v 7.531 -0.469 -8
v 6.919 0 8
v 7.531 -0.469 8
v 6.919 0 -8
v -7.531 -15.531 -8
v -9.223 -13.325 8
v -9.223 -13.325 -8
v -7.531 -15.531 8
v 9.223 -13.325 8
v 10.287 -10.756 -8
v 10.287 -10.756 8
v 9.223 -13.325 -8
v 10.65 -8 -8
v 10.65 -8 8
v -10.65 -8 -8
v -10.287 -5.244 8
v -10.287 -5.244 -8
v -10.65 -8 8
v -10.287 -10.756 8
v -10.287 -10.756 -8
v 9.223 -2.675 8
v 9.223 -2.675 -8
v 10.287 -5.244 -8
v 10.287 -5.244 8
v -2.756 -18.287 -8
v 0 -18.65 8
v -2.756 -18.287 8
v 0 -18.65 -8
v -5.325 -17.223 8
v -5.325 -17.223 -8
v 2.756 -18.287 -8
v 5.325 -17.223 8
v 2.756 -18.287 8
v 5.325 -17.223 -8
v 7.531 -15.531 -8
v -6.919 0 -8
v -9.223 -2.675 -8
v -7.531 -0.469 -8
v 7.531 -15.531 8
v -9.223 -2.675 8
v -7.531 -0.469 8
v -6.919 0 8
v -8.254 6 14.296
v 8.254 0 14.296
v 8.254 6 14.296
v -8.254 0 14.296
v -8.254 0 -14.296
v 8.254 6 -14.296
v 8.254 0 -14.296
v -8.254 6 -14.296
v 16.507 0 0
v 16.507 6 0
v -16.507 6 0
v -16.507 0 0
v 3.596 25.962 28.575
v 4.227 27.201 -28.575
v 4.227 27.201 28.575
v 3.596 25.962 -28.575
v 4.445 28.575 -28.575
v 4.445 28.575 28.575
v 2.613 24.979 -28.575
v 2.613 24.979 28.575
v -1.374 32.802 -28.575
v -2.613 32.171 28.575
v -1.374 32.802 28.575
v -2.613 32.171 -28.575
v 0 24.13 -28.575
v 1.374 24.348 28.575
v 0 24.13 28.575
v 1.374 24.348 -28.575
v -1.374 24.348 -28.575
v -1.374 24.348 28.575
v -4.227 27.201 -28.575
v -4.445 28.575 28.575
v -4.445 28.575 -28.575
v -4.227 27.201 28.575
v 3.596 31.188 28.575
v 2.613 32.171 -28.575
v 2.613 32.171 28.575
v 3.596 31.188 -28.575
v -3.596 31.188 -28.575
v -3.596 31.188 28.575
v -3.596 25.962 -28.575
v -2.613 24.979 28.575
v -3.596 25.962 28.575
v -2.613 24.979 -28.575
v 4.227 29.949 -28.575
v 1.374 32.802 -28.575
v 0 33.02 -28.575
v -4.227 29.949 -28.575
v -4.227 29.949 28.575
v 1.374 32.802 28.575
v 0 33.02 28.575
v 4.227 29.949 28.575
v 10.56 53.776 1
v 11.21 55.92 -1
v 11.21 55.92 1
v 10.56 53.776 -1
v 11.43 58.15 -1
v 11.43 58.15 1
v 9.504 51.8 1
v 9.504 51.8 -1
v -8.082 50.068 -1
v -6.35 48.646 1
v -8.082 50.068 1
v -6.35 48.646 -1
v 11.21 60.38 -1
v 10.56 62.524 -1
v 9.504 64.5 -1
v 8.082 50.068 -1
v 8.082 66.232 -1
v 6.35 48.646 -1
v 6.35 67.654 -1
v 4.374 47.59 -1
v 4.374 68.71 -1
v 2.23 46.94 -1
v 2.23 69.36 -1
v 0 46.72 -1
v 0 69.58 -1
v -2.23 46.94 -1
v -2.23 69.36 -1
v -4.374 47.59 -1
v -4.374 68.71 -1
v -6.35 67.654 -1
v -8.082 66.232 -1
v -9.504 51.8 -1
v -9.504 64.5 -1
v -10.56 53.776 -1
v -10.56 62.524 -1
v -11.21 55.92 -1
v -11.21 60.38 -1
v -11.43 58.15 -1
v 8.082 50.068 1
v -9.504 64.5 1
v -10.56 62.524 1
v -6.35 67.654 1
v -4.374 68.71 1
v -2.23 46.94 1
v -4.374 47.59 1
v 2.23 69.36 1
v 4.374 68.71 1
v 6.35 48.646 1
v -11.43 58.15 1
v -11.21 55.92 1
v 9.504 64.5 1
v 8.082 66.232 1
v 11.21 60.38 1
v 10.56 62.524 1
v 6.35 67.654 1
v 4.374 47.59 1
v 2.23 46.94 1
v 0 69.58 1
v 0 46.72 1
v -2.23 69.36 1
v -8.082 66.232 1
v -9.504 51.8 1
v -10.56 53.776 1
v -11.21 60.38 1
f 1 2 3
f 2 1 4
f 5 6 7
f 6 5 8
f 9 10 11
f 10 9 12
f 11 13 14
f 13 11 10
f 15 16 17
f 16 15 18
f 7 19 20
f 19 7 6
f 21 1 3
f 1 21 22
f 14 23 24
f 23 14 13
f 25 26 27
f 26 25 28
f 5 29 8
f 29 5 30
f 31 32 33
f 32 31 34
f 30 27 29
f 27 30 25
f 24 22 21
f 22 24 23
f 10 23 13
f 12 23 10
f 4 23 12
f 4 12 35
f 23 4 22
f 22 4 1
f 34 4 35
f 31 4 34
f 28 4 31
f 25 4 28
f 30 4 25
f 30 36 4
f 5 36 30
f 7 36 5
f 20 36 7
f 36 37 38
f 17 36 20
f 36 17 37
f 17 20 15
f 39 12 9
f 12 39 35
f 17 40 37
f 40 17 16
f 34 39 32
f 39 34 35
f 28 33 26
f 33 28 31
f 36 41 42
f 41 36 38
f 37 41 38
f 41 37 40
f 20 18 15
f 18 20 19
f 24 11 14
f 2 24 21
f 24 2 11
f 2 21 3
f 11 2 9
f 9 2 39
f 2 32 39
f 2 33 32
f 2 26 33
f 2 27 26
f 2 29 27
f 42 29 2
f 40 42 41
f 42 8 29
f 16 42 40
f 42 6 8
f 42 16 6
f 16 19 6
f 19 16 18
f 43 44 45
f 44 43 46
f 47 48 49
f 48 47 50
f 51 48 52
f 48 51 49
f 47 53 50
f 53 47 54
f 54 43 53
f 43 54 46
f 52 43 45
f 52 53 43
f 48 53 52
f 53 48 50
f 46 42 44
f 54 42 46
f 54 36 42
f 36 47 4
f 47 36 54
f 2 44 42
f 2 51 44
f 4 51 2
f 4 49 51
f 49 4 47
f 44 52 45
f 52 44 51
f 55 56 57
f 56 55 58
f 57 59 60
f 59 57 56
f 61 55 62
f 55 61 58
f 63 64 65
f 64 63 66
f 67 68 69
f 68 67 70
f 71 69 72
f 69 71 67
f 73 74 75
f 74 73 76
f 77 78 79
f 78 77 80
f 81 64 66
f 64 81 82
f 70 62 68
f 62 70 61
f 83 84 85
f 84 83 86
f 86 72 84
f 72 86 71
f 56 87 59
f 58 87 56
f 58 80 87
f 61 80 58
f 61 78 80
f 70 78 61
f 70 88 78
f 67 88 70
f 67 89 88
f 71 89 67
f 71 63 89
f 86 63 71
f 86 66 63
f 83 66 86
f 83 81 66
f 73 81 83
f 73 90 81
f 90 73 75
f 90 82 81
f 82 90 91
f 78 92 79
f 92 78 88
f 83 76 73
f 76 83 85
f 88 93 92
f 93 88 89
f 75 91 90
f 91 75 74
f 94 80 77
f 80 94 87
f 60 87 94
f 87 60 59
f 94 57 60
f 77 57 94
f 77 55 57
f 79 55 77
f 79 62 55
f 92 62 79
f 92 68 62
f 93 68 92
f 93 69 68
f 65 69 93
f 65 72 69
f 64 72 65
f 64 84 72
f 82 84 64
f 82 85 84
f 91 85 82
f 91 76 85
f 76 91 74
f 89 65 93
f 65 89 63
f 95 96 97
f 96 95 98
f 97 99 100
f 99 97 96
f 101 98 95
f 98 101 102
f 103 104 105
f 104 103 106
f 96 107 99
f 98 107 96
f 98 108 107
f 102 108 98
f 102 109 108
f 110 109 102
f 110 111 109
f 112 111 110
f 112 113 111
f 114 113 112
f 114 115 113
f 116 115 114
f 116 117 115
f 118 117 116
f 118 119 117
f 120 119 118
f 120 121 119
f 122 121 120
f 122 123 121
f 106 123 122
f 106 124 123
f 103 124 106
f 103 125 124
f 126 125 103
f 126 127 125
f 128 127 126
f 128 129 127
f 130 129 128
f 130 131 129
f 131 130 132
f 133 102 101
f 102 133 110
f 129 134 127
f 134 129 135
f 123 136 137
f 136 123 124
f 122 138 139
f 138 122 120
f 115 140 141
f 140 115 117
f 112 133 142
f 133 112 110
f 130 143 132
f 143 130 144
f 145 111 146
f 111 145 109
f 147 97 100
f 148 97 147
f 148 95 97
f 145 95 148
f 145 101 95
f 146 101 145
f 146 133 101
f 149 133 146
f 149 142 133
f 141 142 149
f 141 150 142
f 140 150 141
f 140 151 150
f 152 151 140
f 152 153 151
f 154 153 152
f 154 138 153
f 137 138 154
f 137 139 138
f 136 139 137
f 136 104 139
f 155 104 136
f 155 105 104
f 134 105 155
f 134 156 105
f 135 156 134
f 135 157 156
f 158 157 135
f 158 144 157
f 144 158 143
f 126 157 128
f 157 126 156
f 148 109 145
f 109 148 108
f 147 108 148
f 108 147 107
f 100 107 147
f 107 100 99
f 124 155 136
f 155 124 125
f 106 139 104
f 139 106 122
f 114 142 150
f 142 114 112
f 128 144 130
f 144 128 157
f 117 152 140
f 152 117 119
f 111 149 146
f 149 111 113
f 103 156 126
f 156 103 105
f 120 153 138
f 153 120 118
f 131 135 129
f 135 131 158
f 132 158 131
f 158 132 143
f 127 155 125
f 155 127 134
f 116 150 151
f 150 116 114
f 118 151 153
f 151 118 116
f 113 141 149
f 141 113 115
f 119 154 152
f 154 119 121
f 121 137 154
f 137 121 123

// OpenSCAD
// Auto-generated by scripts/author_from_manifest.py (Phase D.3).
// Source: data/phase_d_manifest.json (sku_intent='globe-gl8016-upright-155f').
// Do not hand-edit — regenerate from the manifest.
//
// @part globe_gl8016_upright_155f
// @kind sprinkler_head
// @category head.upright.k80
// @display-name "Globe GL8016 Upright K8.0 SR 155°F"
// @mfg globe_fire_sprinkler
// @mfg-pn GL8016
// @listing UL FM
// @hazard-classes OH1 OH2
// @price-usd 15.75
// @install-minutes 8
// @crew journeyman
// @k-factor 8
// @orientation upright
// @response standard
// @temperature 155F
// @param size_in number default=0.5 label="Size" unit="in"
// @port inlet position=[0,0.014,0] direction=[0,1,0] style=NPT_threaded size_in=0.5 role=drop

size_in = 0.5;
k_factor = 8.0;

length_mm   = 57.15;
body_dia_mm = 25.40;
thread_od   = 21.3;
thread_len  = 16;
deflector_d = body_dia_mm * 0.9;

rotate([180,0,0]) union() {
    translate([0, thread_len/2, 0])
        cylinder(h = thread_len, d = thread_od, center = true, $fn = 24);
    translate([0, -3, 0])
        rotate([90, 0, 0])
        cylinder(h = 6, d = thread_od * 1.55, $fn = 6, center = true);
    translate([0, -length_mm/2, 0])
        cylinder(h = length_mm, d = body_dia_mm * 0.35, center = true, $fn = 20);
    translate([0, -length_mm - 1, 0])
        cylinder(h = 2, d = deflector_d, center = true, $fn = 32);
}
